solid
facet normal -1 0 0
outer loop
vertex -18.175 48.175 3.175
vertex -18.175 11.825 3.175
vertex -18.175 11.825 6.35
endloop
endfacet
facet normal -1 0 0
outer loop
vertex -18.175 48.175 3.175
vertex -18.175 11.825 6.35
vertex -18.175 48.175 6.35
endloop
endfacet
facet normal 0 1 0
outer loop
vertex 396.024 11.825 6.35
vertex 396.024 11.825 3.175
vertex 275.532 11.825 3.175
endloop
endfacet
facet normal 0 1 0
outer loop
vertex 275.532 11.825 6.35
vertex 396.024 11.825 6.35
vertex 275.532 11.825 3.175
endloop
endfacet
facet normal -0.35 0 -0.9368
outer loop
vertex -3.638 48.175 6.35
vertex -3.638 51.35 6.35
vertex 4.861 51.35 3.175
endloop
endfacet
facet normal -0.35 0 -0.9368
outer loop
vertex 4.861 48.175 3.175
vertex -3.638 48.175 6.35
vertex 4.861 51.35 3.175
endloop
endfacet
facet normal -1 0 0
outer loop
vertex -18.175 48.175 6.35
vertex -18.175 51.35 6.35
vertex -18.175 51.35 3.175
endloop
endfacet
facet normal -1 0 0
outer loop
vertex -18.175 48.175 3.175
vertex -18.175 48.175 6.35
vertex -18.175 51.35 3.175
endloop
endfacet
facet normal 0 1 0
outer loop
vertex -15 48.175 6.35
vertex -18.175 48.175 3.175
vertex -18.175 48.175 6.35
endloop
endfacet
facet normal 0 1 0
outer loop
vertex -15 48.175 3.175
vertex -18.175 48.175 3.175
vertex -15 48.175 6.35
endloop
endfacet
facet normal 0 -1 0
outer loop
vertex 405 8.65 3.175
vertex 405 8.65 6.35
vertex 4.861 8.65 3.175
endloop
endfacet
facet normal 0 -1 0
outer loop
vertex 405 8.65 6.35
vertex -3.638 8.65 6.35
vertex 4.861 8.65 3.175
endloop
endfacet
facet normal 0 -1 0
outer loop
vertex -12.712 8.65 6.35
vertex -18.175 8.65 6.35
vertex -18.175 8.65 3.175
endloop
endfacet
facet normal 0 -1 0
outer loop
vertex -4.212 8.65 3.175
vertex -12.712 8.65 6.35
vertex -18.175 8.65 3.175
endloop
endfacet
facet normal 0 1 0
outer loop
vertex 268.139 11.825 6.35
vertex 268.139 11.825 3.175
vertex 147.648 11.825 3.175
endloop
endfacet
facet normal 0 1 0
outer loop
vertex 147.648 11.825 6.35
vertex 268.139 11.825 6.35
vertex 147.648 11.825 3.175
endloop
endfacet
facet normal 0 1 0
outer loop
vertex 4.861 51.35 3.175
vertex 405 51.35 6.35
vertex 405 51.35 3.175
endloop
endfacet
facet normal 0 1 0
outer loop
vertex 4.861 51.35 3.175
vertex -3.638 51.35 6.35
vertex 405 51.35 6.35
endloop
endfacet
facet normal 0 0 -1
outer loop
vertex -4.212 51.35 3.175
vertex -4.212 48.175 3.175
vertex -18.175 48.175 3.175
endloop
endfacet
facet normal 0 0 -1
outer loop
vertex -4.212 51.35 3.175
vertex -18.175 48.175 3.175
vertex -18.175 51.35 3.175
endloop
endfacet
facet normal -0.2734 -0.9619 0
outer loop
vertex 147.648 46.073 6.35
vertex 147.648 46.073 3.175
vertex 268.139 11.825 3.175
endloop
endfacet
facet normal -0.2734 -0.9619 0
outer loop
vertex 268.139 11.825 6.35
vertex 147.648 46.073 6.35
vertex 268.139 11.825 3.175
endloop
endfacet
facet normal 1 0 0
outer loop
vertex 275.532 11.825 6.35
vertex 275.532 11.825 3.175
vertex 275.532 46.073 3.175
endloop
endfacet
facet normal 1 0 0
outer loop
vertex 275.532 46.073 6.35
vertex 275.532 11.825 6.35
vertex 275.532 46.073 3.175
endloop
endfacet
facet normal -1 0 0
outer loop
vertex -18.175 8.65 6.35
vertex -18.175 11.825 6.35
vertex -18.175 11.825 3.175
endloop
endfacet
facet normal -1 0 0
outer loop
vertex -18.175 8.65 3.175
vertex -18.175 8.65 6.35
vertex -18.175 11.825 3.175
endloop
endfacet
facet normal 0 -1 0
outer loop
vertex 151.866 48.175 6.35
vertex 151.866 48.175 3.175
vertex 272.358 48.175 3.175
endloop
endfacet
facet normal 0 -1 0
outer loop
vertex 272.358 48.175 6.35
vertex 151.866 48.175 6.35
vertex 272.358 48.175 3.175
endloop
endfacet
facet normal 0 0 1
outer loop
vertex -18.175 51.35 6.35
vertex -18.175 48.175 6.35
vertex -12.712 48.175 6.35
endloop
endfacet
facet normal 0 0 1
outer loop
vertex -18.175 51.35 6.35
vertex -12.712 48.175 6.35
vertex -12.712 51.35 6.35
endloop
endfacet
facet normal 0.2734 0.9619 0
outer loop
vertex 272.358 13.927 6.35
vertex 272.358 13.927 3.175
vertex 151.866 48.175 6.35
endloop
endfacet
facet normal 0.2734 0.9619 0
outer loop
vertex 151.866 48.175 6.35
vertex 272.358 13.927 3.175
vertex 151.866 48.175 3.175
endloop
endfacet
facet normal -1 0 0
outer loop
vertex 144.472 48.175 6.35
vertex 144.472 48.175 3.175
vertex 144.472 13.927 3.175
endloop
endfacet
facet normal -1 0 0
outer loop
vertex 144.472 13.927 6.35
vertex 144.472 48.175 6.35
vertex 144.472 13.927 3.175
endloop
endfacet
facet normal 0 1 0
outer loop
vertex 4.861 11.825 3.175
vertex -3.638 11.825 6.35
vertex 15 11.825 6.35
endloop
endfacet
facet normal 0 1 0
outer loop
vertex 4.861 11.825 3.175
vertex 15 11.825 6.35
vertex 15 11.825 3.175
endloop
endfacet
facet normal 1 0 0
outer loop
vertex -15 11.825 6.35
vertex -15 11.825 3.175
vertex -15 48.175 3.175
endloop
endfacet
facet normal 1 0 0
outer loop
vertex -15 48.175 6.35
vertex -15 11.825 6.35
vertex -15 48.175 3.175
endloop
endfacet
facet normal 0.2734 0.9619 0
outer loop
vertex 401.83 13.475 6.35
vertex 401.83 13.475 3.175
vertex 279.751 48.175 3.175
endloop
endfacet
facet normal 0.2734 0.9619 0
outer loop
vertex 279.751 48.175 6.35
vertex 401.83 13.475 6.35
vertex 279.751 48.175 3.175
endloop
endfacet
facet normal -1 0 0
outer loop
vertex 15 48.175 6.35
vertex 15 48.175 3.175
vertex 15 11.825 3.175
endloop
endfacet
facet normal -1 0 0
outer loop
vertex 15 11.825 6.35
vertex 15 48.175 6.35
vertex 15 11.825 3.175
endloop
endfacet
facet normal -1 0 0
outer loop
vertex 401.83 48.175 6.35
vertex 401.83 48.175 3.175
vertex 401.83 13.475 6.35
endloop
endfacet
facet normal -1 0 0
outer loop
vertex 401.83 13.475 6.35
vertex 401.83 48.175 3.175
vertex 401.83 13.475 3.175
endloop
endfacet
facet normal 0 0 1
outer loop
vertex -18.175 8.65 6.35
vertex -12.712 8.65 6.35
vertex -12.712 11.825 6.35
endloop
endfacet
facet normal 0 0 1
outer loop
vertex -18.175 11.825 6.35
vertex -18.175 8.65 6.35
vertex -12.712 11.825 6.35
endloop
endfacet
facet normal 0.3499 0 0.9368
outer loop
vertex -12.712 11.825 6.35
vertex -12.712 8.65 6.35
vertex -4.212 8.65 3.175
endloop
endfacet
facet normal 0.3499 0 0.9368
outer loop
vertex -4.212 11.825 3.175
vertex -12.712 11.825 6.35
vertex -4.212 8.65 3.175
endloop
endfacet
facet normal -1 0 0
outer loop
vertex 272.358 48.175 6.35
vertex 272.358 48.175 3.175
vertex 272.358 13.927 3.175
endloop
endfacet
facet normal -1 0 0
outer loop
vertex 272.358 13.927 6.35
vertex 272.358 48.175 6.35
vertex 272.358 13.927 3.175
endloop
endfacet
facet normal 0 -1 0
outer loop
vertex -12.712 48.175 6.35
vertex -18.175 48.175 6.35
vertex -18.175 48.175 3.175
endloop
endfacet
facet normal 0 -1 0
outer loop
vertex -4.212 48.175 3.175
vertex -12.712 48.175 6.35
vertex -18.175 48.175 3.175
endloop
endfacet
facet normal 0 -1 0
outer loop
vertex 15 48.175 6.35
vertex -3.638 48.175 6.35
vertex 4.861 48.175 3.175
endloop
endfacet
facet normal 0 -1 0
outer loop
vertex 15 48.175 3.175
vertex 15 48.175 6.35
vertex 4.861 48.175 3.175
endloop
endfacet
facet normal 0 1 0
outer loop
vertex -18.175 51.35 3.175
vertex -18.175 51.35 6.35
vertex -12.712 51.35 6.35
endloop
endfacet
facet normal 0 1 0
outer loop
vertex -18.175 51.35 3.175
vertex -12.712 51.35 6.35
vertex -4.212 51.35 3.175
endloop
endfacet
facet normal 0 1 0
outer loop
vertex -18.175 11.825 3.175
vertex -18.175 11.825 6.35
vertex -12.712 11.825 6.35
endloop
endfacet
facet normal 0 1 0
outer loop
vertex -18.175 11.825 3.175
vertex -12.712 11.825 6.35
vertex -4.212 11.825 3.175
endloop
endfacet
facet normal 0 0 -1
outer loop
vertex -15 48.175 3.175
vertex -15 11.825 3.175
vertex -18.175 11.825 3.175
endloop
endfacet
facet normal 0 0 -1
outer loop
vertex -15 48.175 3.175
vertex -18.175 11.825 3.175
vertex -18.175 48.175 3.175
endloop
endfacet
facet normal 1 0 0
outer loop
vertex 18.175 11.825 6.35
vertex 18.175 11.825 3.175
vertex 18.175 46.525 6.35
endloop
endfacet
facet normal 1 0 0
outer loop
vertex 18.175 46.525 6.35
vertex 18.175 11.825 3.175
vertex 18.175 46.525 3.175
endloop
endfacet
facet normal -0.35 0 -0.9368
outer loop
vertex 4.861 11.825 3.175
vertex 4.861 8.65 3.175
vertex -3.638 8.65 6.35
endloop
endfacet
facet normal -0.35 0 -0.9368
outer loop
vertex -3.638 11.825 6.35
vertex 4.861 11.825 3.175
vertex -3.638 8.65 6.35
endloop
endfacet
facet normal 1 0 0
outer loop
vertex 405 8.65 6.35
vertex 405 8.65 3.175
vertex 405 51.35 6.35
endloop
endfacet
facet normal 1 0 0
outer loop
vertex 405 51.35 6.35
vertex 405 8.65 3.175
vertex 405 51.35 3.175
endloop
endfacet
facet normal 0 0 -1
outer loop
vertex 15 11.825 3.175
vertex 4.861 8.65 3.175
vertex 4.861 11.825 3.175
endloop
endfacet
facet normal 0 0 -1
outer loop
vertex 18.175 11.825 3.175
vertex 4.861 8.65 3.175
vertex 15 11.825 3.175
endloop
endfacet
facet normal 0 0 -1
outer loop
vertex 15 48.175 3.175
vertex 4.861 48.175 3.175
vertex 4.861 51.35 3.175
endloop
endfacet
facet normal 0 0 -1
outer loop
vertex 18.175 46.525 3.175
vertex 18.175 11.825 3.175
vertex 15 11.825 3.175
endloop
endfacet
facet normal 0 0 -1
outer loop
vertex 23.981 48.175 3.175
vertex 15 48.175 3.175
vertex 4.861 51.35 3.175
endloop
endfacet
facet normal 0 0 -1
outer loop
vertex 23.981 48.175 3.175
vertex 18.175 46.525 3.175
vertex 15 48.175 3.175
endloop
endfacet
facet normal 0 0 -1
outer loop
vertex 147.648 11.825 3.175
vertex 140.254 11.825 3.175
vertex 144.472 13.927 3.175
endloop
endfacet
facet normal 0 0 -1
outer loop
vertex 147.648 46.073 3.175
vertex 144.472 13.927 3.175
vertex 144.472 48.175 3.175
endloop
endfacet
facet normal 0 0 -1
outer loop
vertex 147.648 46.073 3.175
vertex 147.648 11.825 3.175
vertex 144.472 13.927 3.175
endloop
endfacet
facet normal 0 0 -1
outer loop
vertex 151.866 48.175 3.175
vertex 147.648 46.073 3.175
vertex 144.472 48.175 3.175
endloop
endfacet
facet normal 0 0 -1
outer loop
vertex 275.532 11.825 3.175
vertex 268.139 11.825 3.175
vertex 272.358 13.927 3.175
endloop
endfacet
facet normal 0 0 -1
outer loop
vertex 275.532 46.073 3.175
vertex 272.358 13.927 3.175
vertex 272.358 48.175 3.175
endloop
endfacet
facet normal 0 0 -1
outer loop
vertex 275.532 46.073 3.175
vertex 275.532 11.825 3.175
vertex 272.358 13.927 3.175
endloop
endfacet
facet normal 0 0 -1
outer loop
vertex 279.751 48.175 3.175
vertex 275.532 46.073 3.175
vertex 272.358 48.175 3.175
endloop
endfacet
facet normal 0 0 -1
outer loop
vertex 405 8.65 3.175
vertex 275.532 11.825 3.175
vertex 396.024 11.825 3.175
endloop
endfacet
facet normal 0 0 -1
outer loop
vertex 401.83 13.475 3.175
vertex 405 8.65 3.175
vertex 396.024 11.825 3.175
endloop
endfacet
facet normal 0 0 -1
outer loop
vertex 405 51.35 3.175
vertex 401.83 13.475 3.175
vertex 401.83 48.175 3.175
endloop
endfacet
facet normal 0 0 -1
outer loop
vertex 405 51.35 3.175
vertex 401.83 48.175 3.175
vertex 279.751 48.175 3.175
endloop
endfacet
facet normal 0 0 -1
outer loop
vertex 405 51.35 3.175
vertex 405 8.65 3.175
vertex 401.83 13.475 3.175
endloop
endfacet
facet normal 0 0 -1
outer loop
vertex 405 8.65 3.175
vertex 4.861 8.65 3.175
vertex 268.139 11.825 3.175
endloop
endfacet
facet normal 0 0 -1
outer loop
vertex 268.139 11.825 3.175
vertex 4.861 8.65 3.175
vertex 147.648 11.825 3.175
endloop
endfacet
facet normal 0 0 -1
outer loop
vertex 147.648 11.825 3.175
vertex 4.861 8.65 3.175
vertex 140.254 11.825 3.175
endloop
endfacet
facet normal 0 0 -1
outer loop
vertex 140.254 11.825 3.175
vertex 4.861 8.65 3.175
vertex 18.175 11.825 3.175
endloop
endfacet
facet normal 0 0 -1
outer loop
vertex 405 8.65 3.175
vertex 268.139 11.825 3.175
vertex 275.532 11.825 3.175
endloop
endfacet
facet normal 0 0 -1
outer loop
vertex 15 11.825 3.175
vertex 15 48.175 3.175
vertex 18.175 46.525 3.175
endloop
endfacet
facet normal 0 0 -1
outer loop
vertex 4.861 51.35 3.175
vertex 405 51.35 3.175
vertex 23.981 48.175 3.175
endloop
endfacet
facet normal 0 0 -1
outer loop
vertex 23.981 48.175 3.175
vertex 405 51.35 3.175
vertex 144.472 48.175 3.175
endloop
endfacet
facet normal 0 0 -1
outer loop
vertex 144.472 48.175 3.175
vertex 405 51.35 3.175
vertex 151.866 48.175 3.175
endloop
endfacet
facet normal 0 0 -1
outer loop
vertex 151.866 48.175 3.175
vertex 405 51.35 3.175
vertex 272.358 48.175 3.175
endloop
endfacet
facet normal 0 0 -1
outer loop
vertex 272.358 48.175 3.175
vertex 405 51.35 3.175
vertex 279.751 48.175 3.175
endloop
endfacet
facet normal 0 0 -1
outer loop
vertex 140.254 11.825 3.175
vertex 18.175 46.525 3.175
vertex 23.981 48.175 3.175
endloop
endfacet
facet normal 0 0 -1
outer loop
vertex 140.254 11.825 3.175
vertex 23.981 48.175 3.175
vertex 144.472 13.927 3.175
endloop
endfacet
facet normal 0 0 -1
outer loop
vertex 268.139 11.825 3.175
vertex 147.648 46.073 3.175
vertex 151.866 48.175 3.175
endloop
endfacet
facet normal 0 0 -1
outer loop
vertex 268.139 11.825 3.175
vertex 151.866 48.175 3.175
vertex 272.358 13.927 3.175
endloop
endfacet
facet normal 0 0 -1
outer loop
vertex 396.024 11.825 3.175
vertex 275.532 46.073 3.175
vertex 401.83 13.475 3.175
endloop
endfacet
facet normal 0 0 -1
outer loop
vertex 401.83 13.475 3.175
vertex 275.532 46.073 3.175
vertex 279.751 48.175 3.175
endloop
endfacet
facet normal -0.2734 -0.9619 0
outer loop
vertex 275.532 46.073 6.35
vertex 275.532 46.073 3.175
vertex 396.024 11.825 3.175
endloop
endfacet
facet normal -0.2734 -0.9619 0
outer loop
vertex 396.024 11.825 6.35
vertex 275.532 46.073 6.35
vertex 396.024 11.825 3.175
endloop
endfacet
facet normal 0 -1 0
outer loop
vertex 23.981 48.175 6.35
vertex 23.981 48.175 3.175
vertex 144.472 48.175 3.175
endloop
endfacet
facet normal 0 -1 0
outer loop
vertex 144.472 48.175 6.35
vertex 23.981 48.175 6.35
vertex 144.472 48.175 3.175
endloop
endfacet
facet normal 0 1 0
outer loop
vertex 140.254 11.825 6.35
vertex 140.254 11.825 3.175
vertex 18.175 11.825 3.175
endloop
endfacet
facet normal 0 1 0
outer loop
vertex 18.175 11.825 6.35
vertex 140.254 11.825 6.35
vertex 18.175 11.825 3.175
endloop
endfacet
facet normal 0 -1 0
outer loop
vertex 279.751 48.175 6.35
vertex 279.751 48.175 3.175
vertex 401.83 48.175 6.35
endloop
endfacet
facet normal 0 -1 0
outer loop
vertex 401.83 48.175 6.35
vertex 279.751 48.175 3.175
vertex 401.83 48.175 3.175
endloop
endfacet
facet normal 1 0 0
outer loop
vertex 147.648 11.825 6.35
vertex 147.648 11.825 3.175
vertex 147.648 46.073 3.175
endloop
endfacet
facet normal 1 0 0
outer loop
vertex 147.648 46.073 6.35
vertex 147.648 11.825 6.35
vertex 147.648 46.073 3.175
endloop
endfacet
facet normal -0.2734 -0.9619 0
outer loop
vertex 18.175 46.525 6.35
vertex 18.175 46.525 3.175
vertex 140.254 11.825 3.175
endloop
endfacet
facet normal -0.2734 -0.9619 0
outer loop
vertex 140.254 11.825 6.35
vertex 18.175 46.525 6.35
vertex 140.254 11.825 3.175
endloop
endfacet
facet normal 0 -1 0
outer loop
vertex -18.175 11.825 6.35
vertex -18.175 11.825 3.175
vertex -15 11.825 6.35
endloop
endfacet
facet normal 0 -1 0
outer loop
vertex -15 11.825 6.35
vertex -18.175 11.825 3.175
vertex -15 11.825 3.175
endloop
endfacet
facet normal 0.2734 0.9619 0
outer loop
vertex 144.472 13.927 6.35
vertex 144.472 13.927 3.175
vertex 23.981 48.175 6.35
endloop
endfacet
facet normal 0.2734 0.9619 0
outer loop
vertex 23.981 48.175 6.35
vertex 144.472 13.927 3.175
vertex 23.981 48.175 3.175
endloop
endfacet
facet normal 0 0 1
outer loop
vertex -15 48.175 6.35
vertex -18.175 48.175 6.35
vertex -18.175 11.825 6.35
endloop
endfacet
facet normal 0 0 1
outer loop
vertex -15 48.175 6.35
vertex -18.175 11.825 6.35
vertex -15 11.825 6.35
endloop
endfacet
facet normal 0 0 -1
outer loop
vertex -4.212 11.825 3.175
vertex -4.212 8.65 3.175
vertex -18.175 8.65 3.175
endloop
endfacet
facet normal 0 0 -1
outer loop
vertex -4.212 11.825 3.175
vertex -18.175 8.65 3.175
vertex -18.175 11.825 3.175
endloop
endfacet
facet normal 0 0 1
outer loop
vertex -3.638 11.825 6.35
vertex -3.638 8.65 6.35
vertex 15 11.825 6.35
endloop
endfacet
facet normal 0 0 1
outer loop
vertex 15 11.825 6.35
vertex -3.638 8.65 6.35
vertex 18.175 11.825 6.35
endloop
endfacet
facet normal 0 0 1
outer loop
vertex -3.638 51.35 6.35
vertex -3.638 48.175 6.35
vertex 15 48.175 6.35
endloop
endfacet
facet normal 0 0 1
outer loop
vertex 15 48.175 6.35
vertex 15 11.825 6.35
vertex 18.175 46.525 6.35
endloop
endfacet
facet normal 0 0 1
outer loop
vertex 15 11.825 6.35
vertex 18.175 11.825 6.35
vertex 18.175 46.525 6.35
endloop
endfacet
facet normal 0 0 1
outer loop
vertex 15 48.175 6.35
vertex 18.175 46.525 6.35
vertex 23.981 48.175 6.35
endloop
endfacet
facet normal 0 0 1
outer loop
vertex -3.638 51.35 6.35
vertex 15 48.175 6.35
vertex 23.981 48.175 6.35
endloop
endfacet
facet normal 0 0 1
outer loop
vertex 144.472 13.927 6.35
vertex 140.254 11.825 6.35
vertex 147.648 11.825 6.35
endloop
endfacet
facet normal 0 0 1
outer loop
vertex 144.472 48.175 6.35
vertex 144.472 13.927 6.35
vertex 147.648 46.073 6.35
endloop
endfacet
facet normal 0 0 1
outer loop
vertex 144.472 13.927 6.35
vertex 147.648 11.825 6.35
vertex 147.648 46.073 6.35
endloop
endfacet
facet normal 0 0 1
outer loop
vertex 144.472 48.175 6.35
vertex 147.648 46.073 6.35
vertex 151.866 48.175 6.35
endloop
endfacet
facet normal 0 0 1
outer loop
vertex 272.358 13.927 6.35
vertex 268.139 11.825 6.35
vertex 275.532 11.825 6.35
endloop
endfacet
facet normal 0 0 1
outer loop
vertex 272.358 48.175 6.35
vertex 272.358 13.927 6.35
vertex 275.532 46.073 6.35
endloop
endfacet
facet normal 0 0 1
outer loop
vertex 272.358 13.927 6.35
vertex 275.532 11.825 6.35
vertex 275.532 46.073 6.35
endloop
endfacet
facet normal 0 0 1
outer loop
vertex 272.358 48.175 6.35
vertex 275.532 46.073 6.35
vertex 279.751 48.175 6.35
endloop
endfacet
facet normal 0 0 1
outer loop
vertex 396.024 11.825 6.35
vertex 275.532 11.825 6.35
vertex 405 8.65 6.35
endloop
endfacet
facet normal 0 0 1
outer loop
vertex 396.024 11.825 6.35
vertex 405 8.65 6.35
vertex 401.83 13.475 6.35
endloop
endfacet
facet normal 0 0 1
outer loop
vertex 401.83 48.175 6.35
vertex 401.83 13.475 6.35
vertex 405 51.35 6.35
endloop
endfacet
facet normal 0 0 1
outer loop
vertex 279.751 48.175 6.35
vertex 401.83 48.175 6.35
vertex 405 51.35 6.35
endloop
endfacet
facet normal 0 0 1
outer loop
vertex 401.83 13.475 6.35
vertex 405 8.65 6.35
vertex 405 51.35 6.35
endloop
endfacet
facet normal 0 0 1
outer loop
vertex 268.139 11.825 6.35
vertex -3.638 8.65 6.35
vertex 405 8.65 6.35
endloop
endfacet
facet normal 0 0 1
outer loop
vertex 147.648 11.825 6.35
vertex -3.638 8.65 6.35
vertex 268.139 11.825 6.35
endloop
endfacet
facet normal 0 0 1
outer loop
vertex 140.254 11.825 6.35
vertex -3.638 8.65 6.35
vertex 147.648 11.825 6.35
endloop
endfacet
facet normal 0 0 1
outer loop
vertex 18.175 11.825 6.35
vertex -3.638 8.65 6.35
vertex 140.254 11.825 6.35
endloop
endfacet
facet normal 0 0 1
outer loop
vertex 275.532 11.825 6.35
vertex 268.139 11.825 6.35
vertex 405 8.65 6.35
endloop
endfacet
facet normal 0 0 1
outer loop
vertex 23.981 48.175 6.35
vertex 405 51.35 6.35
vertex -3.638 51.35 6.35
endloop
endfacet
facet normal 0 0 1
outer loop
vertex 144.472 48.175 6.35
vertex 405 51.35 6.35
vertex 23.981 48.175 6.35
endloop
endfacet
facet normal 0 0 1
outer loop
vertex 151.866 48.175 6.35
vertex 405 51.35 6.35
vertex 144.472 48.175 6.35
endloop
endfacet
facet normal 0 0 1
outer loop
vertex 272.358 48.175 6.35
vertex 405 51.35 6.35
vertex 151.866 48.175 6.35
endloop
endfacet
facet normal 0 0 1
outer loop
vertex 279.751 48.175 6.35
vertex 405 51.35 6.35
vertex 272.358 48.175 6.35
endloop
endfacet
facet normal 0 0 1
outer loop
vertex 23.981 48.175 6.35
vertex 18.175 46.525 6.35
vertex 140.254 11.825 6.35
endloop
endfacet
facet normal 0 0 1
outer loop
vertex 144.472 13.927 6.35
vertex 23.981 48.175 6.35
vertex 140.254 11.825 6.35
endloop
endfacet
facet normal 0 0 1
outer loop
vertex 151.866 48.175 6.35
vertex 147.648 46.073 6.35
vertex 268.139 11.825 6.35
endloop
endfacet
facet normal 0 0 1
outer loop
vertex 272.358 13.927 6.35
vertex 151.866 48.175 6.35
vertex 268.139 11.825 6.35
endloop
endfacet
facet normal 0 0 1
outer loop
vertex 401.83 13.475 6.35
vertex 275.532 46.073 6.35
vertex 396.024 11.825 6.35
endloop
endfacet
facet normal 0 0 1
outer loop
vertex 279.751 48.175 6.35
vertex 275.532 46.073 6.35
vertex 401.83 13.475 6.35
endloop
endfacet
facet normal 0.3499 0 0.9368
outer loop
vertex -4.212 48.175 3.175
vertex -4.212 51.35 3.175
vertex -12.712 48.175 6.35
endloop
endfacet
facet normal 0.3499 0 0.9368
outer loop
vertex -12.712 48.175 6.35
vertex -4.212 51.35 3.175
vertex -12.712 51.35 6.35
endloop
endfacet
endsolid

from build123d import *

# Parameters (mm, degrees)
BOSS_EXTRUDE1_DEPTH   = 3.175
BOSS_EXTRUDE1_2_DEPTH = 3.175
SKETCH2_W             = 3.175
SKETCH2_H             = 36.35
BOSS_EXTRUDE2_DEPTH   = 3.175
SKETCH3_W             = 3.175
SKETCH3_H             = 3.175
BOSS_EXTRUDE8_DEPTH   = 423.175
BOSS_EXTRUDE8_2_DEPTH = 423.175
SKETCH4_W             = 3.175
SKETCH4_H             = 36.35
CUT_EXTRUDE1_DEPTH    = 427.326430831
CUT_EXTRUDE7_DEPTH    = 3.175
CUT_EXTRUDE8_DEPTH    = 3.175
SKETCH11_W            = 386.825
SKETCH11_H            = 36.35
BOSS_EXTRUDE9_DEPTH   = 3.175
CUT_EXTRUDE9_DEPTH    = 3.175


with BuildPart() as part:
    # Sketch1 → Boss-Extrude1 (new body)
    with BuildSketch(Plane.XY):
        Polygon((15, 45), (405, 45), (405, 48.175), (18.175, 48.175), (-18.175, 48.175), (-18.175, 45), (-15, 45), align=None)
    extrude(amount=BOSS_EXTRUDE1_DEPTH)



with BuildPart() as body_2:
    # Sketch1 → Boss-Extrude1 2 (new body)
    with BuildSketch(Plane.XY):
        Polygon((-18.175, 15), (-15, 15), (15, 15), (405, 15), (405, 11.825), (18.175, 11.825), (-18.175, 11.825), align=None)
    extrude(amount=BOSS_EXTRUDE1_2_DEPTH)


with BuildPart() as part_1:
    add(part.part)

    add(body_2.part)  # Boss-Extrude2 merges body 2
    # Sketch2 → Boss-Extrude2 (add)
    with BuildSketch(Plane.XY.offset(3.175)):
        with Locations((-16.5875, 30)):
            Rectangle(SKETCH2_W, SKETCH2_H)
        Polygon((15, 11.825), (22.589723325, 11.825), (112.5, 46.473699254), (112.5, 12.285600704), (112.5, 11.825), (120.025102002, 11.825), (208.4125, 46.469905429), (208.4125, 11.825), (215.937602002, 11.825), (304.325, 46.469905429), (304.325, 11.825), (311.914723325, 11.825), (401.825, 46.473699254), (401.825, 11.825), (405, 11.825), (405, 48.175), (397.410276675, 48.175), (307.5, 13.526300746), (307.5, 48.175), (299.974897998, 48.175), (211.5875, 13.530094571), (211.5875, 48.175), (204.062397998, 48.175), (115.675, 13.530094571), (115.675, 48.175), (108.085276675, 48.175), (18.175, 13.526300746), (18.175, 48.175), (15, 48.175), align=None)
    extrude(amount=BOSS_EXTRUDE2_DEPTH)

    # Sketch4 → Cut-Extrude1 (cut, through all)
    with BuildSketch(Plane(origin=(405, 0, 0), x_dir=(0, 0, -1), z_dir=(1, 0, 0))):
        with Locations((-1.5875, 30)):
            Rectangle(SKETCH4_W, SKETCH4_H)
    extrude(amount=-CUT_EXTRUDE1_DEPTH, mode=Mode.SUBTRACT)


with BuildPart() as body_2_2:
    # Sketch3 → Boss-Extrude8 (new body)
    with BuildSketch(Plane(origin=(405, 0, 0), x_dir=(0, 0, -1), z_dir=(1, 0, 0))):
        with Locations((-4.7625, 49.7625)):
            Rectangle(SKETCH3_W, SKETCH3_H)
    extrude(amount=-BOSS_EXTRUDE8_DEPTH)

    # Sketch9 → Cut-Extrude8 (cut)
    with BuildSketch(Plane(origin=(0, 51.35, 0), x_dir=(1, 0, 0), z_dir=(0, 1, 0))):
        Polygon((-3.638332101, -6.35), (4.861361865, -3.175), (-4.211973934, -3.175), (-12.711667899, -6.35), align=None)
    extrude(amount=-CUT_EXTRUDE8_DEPTH, mode=Mode.SUBTRACT)


with BuildPart() as body_3:
    # Sketch3 → Boss-Extrude8 2 (new body)
    with BuildSketch(Plane(origin=(405, 0, 0), x_dir=(0, 0, -1), z_dir=(1, 0, 0))):
        with Locations((-4.7625, 10.2375)):
            Rectangle(SKETCH3_W, SKETCH3_H)
    extrude(amount=-BOSS_EXTRUDE8_2_DEPTH)

    # Sketch5 → Cut-Extrude7 (cut)
    with BuildSketch(Plane.XZ.offset(-8.65)):
        Polygon((-4.211973934, 3.175), (4.861361865, 3.175), (-3.638332101, 6.35), (-12.711667899, 6.35), align=None)
    extrude(amount=-CUT_EXTRUDE7_DEPTH, mode=Mode.SUBTRACT)


with BuildPart() as cut_extrude1_piece_1:
    # of the separate pieces the step leaves, piece 1, a body of its own (cut_extrude1_pieces)
    add(part_1.part.solids().sort_by_distance((401.825, 11.825, 3.175))[0])



with BuildPart() as cut_extrude1_piece_2:
    # of the separate pieces the step leaves, piece 2, a body of its own (cut_extrude1_pieces)
    add(part_1.part.solids().sort_by_distance((-15, 48.175, 3.175))[0])


with BuildPart() as cut_extrude7_piece_1:
    # of the separate pieces the step leaves, piece 1, a body of its own (cut_extrude7_pieces)
    add(body_3.part.solids().sort_by_distance((405, 11.825, 3.175))[0])


with BuildPart() as cut_extrude7_piece_2:
    # of the separate pieces the step leaves, piece 2, a body of its own (cut_extrude7_pieces)
    add(body_3.part.solids().sort_by_distance((-12.711667899, 11.825, 6.35))[0])


with BuildPart() as cut_extrude8_piece_1:
    # of the separate pieces the step leaves, piece 1, a body of its own (cut_extrude8_pieces)
    add(body_2_2.part.solids().sort_by_distance((405, 51.35, 6.35))[0])


with BuildPart() as cut_extrude8_piece_2:
    # of the separate pieces the step leaves, piece 2, a body of its own (cut_extrude8_pieces)
    add(body_2_2.part.solids().sort_by_distance((-12.711667899, 51.35, 6.35))[0])


with BuildPart() as cut_extrude1_piece_1_1:
    add(cut_extrude1_piece_1.part)

    add(cut_extrude7_piece_1.part)  # Boss-Extrude9 merges Cut-Extrude7 piece 1

    add(cut_extrude8_piece_1.part)  # Boss-Extrude9 merges Cut-Extrude8 piece 1
    # Sketch11 → Boss-Extrude9 (add)
    with BuildSketch(Plane(origin=(0, 0, 3.175), x_dir=(-1, 0, 0), z_dir=(0, 0, -1))):
        with Locations((-211.5875, 30)):
            Rectangle(SKETCH11_W, SKETCH11_H)
    extrude(amount=-BOSS_EXTRUDE9_DEPTH)

    # Sketch12 → Cut-Extrude9 (cut)
    with BuildSketch(Plane(origin=(0, 0, 3.175), x_dir=(-1, 0, 0), z_dir=(0, 0, -1))):
        Polygon((-18.175, 46.52461662), (-140.253692473, 11.825), (-18.175, 11.825), align=None)
        Polygon((-23.981307527, 48.175), (-144.4725, 48.175), (-144.4725, 13.926613978), align=None)
        Polygon((-268.138692473, 11.825), (-147.6475, 11.825), (-147.6475, 46.073386022), align=None)
        Polygon((-272.3575, 13.926613978), (-151.866307527, 48.175), (-272.3575, 48.175), align=None)
        Polygon((-396.023692473, 11.825), (-275.5325, 11.825), (-275.5325, 46.073386022), align=None)
        Polygon((-401.83, 13.47538338), (-279.751307527, 48.175), (-401.83, 48.175), align=None)
    extrude(amount=-CUT_EXTRUDE9_DEPTH, mode=Mode.SUBTRACT)


solid = Compound([cut_extrude1_piece_2.part, cut_extrude7_piece_2.part, cut_extrude8_piece_2.part, cut_extrude1_piece_1_1.part])
